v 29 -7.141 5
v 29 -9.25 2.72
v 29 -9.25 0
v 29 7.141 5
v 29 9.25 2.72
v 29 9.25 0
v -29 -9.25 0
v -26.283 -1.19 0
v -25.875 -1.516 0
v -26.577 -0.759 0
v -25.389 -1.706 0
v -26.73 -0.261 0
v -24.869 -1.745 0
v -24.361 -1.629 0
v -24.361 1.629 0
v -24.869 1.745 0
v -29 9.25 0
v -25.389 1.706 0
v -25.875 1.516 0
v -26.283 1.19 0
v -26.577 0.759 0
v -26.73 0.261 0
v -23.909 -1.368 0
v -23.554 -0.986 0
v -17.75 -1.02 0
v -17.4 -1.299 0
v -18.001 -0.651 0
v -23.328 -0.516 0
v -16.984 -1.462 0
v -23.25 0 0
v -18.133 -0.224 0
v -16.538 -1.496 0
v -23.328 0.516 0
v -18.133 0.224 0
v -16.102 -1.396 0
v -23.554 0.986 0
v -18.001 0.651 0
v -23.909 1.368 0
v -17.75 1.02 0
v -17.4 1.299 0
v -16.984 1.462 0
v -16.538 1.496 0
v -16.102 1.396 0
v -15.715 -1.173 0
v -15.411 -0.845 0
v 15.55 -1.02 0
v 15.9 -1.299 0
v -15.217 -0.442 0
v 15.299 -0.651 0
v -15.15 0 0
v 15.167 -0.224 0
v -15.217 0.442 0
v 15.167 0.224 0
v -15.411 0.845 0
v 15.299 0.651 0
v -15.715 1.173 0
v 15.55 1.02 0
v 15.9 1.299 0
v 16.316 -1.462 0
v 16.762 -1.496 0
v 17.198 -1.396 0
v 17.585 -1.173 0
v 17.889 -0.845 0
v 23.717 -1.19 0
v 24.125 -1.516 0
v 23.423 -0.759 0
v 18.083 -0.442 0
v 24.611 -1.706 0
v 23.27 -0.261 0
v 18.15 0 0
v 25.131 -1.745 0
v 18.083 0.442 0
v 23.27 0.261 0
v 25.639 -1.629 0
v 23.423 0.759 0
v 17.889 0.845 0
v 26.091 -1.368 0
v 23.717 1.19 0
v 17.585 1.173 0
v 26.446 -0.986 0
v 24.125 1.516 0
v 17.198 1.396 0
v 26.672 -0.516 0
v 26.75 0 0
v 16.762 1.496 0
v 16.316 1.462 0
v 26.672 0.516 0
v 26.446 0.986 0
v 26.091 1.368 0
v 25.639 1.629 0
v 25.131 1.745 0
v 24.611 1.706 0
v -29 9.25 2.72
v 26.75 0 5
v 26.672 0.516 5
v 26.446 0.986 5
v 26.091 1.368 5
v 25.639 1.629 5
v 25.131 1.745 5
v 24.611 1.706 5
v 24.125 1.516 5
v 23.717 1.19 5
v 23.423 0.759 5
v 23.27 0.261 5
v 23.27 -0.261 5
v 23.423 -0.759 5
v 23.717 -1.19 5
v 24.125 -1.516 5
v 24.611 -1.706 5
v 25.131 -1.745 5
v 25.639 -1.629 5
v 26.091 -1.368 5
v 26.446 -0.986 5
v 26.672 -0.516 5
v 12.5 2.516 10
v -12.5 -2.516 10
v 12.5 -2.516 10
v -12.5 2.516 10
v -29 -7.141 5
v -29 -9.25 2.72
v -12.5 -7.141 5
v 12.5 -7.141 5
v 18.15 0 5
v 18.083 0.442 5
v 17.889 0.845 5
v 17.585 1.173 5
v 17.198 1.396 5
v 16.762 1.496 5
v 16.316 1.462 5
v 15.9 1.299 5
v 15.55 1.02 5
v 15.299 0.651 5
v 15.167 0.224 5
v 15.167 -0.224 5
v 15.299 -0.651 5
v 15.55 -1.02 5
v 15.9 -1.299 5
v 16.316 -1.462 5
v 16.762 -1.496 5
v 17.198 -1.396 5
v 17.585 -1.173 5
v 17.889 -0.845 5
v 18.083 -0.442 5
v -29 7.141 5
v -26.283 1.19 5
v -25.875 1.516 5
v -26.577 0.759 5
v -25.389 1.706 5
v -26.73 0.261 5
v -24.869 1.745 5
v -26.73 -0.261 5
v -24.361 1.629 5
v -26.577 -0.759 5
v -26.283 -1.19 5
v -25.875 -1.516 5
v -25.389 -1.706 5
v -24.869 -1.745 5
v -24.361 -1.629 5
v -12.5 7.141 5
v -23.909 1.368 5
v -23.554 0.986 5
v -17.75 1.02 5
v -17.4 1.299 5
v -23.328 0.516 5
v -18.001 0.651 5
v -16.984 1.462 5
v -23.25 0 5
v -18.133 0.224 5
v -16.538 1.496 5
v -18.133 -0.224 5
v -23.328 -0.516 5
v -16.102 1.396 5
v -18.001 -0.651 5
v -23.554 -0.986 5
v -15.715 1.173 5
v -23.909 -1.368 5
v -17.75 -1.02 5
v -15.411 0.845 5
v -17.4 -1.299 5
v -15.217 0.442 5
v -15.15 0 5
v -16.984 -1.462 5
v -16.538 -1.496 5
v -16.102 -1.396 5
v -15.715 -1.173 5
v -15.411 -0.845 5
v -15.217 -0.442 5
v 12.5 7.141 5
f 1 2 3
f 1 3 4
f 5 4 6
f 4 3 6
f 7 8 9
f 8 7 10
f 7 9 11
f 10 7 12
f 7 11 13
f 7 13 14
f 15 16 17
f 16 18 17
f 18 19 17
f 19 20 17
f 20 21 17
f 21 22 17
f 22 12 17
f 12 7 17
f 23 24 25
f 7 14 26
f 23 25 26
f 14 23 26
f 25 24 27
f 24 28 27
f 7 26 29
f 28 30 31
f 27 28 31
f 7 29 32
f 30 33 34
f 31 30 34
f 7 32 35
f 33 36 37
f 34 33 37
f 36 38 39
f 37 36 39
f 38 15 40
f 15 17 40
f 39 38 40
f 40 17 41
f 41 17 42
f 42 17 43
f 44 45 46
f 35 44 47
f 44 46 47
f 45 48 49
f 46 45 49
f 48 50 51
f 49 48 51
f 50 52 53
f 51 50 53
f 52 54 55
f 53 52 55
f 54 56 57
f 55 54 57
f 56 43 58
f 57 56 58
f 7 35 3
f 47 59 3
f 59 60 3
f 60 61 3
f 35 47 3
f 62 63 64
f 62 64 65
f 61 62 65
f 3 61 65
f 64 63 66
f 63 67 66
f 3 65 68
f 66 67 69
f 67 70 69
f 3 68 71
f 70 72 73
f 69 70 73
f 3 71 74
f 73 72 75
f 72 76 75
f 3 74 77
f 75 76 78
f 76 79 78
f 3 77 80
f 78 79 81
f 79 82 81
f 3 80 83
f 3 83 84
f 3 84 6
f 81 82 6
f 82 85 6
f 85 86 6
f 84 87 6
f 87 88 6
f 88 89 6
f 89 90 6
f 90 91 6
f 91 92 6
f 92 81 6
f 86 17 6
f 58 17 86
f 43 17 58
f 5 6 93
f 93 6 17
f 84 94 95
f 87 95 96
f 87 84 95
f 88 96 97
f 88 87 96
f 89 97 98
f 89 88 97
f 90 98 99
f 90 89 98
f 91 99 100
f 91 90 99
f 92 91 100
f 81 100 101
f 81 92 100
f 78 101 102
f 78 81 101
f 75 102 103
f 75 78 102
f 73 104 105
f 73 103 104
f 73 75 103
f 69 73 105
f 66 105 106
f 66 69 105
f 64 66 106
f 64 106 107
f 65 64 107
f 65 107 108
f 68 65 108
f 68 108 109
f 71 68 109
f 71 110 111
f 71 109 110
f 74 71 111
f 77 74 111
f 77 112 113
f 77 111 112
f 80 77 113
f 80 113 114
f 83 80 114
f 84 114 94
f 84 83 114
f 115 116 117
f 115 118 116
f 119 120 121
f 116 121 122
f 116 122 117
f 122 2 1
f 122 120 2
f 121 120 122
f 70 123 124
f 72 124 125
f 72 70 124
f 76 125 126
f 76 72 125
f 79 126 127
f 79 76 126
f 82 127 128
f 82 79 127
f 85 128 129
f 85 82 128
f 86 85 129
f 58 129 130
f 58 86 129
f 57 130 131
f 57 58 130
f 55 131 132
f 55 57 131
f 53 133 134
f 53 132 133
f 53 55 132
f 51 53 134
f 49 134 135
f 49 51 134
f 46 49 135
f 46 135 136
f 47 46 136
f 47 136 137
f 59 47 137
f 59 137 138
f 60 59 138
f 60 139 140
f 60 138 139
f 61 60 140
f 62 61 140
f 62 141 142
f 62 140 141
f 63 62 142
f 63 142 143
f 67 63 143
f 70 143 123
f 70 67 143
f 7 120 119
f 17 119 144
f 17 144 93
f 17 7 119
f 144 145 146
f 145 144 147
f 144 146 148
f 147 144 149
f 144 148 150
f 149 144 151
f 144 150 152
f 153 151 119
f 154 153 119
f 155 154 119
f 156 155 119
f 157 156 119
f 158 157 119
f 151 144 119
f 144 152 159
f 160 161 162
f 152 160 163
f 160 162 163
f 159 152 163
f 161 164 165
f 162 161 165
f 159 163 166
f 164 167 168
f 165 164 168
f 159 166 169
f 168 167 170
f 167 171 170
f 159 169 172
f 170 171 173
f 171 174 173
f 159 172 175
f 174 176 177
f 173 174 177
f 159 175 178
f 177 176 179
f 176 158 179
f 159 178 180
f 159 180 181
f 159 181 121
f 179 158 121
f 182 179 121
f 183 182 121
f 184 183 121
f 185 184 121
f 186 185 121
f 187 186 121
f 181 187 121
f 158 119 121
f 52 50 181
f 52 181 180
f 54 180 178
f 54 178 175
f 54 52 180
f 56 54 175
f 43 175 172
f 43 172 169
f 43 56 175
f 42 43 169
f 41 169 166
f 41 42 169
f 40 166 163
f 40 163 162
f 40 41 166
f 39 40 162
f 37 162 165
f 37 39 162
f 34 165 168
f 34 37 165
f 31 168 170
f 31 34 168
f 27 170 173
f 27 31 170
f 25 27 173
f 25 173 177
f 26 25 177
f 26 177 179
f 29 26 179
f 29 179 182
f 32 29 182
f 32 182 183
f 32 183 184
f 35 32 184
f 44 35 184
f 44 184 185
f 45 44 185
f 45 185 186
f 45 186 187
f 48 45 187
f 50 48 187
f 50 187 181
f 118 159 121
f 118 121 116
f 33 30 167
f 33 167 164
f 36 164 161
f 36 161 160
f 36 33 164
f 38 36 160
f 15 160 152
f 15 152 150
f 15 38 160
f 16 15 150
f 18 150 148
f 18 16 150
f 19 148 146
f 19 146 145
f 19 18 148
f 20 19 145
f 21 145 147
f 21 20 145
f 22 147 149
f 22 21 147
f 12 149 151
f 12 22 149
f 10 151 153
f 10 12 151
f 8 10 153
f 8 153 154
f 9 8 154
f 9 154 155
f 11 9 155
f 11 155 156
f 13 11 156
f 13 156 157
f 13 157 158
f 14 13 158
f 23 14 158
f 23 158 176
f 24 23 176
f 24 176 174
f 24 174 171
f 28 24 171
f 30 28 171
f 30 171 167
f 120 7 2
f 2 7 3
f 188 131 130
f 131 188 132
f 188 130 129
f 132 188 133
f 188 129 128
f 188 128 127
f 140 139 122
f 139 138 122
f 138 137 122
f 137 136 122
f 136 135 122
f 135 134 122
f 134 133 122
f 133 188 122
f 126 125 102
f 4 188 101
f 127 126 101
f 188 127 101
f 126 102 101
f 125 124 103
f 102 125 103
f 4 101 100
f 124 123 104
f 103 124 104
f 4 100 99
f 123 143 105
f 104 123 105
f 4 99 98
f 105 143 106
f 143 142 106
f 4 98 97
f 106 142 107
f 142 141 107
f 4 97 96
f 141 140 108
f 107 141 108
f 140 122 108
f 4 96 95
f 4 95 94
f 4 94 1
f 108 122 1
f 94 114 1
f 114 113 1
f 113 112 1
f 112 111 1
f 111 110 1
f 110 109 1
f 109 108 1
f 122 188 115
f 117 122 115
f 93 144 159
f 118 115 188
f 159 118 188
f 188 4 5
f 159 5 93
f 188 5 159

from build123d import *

# Parameters (mm, degrees)
F0_W          = 38
F0_H          = 18.5
F0_R          = 1.5
F0_W_2        = 10
F0_R_2        = 1.75
F1_DEPTH      = 10
F3_DEPTH      = 58.001
F4_W          = 16.5
F4_H          = 12
F5_DEPTH      = 25
F5_DEPTH_BACK = 25


with BuildPart() as f1:
    # F0 (on Top) → F1 (new body)
    with BuildSketch(Plane.XY):
        Rectangle(F0_W, F0_H)
        with Locations((-16.65, 0)):
            Circle(F0_R, mode=Mode.SUBTRACT)
        with Locations((16.65, 0)):
            Circle(F0_R, mode=Mode.SUBTRACT)
        with Locations((24, 0)):
            Rectangle(F0_W_2, F0_H)
        with Locations((25, 0)):
            Circle(F0_R_2, mode=Mode.SUBTRACT)
        with Locations((-24, 0)):
            Rectangle(F0_W_2, F0_H)
        with Locations((-25, 0)):
            Circle(F0_R_2, mode=Mode.SUBTRACT)
    extrude(amount=F1_DEPTH)

    # F2 (on face) → F3 (cut, through all)
    with BuildSketch(Plane.YZ.offset(29)):
        Polygon((-9.25, 10), (-9.25, 2.72), (-4.625, 7.72), (-2.516, 10), align=None)
        Polygon((2.516, 10), (4.625, 7.72), (9.25, 2.72), (9.25, 10), align=None)
    extrude(amount=-F3_DEPTH, mode=Mode.SUBTRACT)

    # F4 (on Front) → F5 (cut, two sides)
    with BuildSketch(Plane.XZ) as f5_sk:
        with Locations((-20.75, 11)):
            Rectangle(F4_W, F4_H)
        with Locations((20.75, 11)):
            Rectangle(F4_W, F4_H)
    extrude(amount=F5_DEPTH, mode=Mode.SUBTRACT)
    extrude(f5_sk.sketch, amount=-F5_DEPTH_BACK, mode=Mode.SUBTRACT)


solid = f1.part
